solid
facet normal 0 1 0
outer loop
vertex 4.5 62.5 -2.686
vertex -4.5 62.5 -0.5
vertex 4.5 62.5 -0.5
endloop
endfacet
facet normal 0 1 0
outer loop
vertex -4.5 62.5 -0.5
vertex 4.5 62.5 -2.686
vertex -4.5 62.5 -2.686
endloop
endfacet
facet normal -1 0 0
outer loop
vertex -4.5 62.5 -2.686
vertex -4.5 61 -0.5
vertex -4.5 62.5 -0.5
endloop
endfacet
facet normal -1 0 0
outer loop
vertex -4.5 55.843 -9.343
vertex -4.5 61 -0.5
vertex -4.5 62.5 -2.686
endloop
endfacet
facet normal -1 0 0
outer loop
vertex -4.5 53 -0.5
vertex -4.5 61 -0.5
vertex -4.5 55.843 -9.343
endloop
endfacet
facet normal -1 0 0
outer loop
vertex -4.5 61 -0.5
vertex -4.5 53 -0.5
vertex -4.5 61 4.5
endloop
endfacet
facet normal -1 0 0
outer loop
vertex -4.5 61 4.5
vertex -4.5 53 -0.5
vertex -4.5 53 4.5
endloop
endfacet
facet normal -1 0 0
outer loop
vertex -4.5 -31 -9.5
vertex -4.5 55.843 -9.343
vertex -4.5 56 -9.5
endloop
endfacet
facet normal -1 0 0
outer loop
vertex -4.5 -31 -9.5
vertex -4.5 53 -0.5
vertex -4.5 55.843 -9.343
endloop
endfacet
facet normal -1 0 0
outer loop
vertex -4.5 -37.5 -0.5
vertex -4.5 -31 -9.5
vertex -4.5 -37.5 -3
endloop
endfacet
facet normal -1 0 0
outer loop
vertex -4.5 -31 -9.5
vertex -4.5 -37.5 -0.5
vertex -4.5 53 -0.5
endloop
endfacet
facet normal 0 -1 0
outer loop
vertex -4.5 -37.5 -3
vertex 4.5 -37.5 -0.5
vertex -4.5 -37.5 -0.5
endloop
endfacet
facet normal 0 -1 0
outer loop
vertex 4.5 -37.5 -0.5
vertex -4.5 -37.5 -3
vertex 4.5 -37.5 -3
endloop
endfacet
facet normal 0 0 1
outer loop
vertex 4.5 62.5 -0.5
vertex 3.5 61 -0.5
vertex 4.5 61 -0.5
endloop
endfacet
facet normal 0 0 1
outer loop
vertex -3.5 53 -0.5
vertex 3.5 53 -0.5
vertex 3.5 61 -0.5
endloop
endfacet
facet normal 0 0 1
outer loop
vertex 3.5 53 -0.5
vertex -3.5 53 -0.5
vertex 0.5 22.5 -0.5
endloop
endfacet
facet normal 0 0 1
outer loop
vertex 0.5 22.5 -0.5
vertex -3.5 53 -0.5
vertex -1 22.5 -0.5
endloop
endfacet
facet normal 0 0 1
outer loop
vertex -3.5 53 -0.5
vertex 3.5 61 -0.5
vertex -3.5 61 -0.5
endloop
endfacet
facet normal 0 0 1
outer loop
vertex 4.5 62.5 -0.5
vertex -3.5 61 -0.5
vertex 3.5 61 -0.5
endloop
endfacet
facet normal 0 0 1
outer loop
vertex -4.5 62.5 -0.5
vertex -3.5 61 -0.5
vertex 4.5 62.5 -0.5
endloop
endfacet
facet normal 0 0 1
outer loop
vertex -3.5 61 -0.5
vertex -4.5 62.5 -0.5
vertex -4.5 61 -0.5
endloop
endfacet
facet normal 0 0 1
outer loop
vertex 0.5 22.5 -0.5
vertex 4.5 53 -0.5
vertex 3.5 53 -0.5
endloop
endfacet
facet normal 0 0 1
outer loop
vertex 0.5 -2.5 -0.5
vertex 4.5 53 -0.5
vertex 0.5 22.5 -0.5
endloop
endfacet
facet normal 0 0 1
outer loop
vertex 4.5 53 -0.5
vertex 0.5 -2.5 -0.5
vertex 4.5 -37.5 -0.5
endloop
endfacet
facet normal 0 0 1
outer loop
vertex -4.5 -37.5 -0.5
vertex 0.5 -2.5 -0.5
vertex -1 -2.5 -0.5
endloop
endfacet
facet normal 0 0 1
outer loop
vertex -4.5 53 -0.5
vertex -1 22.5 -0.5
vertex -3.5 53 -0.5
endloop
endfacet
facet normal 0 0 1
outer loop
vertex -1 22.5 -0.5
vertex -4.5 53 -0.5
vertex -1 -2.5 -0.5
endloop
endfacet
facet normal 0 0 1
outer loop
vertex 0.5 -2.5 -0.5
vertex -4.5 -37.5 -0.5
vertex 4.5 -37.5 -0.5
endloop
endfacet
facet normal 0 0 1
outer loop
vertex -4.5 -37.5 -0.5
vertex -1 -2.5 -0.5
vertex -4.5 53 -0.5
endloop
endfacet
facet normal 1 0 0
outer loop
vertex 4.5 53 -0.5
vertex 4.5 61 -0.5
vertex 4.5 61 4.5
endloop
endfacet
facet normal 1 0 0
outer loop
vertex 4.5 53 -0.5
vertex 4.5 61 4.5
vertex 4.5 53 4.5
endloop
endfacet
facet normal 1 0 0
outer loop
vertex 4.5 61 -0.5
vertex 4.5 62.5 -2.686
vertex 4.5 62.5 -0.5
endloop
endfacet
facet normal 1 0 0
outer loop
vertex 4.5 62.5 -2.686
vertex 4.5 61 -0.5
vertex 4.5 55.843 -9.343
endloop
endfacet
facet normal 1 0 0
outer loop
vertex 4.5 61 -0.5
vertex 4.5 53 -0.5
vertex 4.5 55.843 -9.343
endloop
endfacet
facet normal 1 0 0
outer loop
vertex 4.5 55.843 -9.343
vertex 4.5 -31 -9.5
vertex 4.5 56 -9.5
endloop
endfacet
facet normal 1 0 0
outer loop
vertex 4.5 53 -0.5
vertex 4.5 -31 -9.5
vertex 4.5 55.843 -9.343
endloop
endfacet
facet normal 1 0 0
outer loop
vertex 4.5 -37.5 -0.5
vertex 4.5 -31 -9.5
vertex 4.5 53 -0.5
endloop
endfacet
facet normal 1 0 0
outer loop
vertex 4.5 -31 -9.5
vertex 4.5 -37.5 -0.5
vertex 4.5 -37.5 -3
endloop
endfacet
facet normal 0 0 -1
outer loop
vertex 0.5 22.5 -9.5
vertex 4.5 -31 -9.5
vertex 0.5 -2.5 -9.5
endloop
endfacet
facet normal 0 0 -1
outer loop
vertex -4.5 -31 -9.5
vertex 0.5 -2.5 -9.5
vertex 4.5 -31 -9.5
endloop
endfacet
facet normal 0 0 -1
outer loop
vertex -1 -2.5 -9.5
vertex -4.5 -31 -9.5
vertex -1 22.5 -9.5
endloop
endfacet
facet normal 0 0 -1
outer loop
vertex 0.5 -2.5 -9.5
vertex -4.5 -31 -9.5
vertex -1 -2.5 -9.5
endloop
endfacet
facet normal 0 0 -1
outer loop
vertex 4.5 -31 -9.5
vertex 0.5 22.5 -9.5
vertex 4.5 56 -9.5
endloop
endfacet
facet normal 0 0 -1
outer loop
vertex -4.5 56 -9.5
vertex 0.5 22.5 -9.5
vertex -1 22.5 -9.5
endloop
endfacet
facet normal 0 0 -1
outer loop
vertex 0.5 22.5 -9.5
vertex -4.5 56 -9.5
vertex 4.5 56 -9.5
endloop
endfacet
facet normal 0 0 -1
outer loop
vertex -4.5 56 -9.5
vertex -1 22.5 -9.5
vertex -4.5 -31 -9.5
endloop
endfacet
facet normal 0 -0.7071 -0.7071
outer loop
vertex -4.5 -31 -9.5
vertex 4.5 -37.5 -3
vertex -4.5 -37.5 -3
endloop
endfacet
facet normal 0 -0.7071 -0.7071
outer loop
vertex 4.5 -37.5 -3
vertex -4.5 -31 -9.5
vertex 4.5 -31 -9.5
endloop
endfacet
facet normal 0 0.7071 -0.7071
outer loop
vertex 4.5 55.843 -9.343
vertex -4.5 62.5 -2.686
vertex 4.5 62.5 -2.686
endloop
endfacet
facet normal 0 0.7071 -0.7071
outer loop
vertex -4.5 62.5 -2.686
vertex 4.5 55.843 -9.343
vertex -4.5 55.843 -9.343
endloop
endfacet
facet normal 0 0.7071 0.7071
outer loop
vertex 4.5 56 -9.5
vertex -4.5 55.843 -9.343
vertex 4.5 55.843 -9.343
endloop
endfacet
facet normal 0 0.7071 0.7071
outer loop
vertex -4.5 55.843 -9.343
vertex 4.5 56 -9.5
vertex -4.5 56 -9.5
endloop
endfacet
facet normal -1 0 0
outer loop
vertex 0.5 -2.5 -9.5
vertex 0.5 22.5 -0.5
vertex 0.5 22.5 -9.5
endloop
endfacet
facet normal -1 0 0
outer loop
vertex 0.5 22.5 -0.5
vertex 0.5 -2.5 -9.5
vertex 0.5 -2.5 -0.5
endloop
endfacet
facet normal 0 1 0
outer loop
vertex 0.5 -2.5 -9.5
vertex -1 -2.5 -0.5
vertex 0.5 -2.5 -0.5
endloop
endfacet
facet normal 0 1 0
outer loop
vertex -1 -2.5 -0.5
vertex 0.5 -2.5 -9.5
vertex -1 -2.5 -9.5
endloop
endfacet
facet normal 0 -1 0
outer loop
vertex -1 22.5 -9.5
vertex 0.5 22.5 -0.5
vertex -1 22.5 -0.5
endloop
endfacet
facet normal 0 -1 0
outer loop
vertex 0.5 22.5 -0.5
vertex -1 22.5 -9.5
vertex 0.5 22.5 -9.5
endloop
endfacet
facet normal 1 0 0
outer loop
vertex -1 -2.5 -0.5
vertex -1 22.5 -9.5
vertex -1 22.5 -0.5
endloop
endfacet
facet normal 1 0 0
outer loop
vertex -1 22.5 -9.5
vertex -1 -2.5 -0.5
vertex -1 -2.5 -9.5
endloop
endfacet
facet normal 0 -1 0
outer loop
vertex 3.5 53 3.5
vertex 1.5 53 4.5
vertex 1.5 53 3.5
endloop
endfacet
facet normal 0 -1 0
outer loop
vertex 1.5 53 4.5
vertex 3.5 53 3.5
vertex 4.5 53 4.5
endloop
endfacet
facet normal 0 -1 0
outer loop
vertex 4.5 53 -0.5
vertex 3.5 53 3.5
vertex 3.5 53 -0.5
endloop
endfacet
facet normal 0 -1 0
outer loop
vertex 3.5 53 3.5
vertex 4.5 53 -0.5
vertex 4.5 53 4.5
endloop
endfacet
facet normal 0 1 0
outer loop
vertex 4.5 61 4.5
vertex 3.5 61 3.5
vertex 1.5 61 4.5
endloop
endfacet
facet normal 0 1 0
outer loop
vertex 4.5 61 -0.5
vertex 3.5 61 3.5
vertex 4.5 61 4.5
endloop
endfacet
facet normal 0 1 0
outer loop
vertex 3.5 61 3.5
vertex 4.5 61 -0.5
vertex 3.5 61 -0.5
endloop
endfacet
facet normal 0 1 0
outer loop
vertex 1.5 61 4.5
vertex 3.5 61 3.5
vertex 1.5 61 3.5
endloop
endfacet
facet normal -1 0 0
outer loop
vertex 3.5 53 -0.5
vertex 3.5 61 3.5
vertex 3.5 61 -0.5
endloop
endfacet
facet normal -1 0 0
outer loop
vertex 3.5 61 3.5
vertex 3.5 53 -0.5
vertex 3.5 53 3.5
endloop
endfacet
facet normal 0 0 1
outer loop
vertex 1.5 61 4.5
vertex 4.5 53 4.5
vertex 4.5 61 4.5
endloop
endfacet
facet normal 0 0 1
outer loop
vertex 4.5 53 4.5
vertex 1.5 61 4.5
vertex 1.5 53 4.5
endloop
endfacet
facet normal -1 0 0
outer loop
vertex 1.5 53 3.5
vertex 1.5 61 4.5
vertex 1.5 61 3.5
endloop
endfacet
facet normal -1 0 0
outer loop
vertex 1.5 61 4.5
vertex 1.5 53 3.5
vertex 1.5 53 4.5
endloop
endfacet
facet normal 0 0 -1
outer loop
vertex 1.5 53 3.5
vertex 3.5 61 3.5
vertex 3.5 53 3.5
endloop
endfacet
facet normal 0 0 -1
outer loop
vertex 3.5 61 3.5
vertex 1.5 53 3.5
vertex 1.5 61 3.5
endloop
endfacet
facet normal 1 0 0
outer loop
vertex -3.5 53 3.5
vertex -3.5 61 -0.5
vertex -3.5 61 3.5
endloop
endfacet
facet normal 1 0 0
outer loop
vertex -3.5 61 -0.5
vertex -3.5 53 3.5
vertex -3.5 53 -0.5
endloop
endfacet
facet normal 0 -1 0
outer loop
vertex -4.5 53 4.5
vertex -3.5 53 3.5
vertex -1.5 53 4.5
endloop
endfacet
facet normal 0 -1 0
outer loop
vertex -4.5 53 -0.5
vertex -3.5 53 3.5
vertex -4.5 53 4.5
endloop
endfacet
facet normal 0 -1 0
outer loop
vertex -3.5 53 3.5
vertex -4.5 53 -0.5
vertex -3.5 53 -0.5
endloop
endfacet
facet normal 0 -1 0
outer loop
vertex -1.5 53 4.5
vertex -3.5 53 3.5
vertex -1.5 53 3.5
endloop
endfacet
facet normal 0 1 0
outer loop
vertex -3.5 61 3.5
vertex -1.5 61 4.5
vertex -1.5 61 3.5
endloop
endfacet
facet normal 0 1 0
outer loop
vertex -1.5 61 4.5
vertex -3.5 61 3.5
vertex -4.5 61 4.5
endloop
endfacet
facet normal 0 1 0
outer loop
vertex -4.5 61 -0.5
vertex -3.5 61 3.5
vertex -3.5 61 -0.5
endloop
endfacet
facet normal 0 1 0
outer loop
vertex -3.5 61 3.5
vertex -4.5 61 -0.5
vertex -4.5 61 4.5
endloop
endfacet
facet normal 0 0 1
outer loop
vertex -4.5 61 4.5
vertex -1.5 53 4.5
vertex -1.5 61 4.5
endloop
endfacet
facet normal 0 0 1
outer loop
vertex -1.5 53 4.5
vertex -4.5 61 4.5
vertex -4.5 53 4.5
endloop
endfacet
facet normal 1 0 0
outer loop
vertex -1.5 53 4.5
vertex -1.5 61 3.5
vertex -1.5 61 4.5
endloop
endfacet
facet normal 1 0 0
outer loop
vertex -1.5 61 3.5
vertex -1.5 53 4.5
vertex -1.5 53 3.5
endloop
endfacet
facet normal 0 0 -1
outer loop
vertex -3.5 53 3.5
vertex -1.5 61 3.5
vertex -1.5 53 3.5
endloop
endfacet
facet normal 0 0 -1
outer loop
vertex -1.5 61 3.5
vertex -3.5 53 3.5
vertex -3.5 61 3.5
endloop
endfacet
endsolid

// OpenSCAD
$fn=50;
BOX_W = 38; // Box Width
BOX_L = 86;// Box Length
BOX_H = 1.0; // Box Height
//SCREW_SIZE = .5; // Screw size in mm
CORNER_RADIUS = 1.0; // Radius of corners
WALL = 1.0;// Wall Thickness

KEEL_WIDTH=9.0;
KEEL_HEIGHT=9.0;
KEEL_LENGTH=100;

VENT_OFFSET = 2.5;
VENT_L = 16.5;
VENT_R = -18.5;
 
difference() {
    union() {
        // keel
        translate([0,62.5,-5])
        rotate([90,0,0])
        difference() {
            linear_extrude(KEEL_LENGTH) square([KEEL_WIDTH, KEEL_HEIGHT], center=true); 
            // front of keel slope
            translate([-5, -5, 93])
            rotate([45, 0, 0])
            cube([10, 11, 8]);  
            
            // back of keel slope
            translate([-5, -10, 1])
            rotate([-45, 0, 0])
            cube([10, 11, 8]); 
            
            //center cutout - vent
            // y, z, x
            translate([-1.0,-5, 40])
            rotate([0,0,0])
            //y, z, x
            #cube([1.5, 12, 25]);
        }
        
        // Inverted L-shaped C-clamp
        difference() {
            translate([KEEL_WIDTH/2-3, KEEL_LENGTH-18, -0.5])
            rotate([90, 0, 0])
            union() {
                // Vertical arm of the C-clamp 2
                translate([2.0, 0, 21]) cube([1, 5, 8]);
                // Horizontal arm of the C-clamp
                rotate([90, 0, 0])
                translate([0, 21, -5]) cube([2, 8, 1]);
                  
                // Vertical arm of the C-clamp 1
                translate([-6, 0, 21]) cube([1, 5, 8]);
                // Horizontal arm of the C-clamp
                rotate([90, 0, 0])
                translate([-5.0, 21,-5]) cube([2, 8, 1]);
            }
        }
    }
}
